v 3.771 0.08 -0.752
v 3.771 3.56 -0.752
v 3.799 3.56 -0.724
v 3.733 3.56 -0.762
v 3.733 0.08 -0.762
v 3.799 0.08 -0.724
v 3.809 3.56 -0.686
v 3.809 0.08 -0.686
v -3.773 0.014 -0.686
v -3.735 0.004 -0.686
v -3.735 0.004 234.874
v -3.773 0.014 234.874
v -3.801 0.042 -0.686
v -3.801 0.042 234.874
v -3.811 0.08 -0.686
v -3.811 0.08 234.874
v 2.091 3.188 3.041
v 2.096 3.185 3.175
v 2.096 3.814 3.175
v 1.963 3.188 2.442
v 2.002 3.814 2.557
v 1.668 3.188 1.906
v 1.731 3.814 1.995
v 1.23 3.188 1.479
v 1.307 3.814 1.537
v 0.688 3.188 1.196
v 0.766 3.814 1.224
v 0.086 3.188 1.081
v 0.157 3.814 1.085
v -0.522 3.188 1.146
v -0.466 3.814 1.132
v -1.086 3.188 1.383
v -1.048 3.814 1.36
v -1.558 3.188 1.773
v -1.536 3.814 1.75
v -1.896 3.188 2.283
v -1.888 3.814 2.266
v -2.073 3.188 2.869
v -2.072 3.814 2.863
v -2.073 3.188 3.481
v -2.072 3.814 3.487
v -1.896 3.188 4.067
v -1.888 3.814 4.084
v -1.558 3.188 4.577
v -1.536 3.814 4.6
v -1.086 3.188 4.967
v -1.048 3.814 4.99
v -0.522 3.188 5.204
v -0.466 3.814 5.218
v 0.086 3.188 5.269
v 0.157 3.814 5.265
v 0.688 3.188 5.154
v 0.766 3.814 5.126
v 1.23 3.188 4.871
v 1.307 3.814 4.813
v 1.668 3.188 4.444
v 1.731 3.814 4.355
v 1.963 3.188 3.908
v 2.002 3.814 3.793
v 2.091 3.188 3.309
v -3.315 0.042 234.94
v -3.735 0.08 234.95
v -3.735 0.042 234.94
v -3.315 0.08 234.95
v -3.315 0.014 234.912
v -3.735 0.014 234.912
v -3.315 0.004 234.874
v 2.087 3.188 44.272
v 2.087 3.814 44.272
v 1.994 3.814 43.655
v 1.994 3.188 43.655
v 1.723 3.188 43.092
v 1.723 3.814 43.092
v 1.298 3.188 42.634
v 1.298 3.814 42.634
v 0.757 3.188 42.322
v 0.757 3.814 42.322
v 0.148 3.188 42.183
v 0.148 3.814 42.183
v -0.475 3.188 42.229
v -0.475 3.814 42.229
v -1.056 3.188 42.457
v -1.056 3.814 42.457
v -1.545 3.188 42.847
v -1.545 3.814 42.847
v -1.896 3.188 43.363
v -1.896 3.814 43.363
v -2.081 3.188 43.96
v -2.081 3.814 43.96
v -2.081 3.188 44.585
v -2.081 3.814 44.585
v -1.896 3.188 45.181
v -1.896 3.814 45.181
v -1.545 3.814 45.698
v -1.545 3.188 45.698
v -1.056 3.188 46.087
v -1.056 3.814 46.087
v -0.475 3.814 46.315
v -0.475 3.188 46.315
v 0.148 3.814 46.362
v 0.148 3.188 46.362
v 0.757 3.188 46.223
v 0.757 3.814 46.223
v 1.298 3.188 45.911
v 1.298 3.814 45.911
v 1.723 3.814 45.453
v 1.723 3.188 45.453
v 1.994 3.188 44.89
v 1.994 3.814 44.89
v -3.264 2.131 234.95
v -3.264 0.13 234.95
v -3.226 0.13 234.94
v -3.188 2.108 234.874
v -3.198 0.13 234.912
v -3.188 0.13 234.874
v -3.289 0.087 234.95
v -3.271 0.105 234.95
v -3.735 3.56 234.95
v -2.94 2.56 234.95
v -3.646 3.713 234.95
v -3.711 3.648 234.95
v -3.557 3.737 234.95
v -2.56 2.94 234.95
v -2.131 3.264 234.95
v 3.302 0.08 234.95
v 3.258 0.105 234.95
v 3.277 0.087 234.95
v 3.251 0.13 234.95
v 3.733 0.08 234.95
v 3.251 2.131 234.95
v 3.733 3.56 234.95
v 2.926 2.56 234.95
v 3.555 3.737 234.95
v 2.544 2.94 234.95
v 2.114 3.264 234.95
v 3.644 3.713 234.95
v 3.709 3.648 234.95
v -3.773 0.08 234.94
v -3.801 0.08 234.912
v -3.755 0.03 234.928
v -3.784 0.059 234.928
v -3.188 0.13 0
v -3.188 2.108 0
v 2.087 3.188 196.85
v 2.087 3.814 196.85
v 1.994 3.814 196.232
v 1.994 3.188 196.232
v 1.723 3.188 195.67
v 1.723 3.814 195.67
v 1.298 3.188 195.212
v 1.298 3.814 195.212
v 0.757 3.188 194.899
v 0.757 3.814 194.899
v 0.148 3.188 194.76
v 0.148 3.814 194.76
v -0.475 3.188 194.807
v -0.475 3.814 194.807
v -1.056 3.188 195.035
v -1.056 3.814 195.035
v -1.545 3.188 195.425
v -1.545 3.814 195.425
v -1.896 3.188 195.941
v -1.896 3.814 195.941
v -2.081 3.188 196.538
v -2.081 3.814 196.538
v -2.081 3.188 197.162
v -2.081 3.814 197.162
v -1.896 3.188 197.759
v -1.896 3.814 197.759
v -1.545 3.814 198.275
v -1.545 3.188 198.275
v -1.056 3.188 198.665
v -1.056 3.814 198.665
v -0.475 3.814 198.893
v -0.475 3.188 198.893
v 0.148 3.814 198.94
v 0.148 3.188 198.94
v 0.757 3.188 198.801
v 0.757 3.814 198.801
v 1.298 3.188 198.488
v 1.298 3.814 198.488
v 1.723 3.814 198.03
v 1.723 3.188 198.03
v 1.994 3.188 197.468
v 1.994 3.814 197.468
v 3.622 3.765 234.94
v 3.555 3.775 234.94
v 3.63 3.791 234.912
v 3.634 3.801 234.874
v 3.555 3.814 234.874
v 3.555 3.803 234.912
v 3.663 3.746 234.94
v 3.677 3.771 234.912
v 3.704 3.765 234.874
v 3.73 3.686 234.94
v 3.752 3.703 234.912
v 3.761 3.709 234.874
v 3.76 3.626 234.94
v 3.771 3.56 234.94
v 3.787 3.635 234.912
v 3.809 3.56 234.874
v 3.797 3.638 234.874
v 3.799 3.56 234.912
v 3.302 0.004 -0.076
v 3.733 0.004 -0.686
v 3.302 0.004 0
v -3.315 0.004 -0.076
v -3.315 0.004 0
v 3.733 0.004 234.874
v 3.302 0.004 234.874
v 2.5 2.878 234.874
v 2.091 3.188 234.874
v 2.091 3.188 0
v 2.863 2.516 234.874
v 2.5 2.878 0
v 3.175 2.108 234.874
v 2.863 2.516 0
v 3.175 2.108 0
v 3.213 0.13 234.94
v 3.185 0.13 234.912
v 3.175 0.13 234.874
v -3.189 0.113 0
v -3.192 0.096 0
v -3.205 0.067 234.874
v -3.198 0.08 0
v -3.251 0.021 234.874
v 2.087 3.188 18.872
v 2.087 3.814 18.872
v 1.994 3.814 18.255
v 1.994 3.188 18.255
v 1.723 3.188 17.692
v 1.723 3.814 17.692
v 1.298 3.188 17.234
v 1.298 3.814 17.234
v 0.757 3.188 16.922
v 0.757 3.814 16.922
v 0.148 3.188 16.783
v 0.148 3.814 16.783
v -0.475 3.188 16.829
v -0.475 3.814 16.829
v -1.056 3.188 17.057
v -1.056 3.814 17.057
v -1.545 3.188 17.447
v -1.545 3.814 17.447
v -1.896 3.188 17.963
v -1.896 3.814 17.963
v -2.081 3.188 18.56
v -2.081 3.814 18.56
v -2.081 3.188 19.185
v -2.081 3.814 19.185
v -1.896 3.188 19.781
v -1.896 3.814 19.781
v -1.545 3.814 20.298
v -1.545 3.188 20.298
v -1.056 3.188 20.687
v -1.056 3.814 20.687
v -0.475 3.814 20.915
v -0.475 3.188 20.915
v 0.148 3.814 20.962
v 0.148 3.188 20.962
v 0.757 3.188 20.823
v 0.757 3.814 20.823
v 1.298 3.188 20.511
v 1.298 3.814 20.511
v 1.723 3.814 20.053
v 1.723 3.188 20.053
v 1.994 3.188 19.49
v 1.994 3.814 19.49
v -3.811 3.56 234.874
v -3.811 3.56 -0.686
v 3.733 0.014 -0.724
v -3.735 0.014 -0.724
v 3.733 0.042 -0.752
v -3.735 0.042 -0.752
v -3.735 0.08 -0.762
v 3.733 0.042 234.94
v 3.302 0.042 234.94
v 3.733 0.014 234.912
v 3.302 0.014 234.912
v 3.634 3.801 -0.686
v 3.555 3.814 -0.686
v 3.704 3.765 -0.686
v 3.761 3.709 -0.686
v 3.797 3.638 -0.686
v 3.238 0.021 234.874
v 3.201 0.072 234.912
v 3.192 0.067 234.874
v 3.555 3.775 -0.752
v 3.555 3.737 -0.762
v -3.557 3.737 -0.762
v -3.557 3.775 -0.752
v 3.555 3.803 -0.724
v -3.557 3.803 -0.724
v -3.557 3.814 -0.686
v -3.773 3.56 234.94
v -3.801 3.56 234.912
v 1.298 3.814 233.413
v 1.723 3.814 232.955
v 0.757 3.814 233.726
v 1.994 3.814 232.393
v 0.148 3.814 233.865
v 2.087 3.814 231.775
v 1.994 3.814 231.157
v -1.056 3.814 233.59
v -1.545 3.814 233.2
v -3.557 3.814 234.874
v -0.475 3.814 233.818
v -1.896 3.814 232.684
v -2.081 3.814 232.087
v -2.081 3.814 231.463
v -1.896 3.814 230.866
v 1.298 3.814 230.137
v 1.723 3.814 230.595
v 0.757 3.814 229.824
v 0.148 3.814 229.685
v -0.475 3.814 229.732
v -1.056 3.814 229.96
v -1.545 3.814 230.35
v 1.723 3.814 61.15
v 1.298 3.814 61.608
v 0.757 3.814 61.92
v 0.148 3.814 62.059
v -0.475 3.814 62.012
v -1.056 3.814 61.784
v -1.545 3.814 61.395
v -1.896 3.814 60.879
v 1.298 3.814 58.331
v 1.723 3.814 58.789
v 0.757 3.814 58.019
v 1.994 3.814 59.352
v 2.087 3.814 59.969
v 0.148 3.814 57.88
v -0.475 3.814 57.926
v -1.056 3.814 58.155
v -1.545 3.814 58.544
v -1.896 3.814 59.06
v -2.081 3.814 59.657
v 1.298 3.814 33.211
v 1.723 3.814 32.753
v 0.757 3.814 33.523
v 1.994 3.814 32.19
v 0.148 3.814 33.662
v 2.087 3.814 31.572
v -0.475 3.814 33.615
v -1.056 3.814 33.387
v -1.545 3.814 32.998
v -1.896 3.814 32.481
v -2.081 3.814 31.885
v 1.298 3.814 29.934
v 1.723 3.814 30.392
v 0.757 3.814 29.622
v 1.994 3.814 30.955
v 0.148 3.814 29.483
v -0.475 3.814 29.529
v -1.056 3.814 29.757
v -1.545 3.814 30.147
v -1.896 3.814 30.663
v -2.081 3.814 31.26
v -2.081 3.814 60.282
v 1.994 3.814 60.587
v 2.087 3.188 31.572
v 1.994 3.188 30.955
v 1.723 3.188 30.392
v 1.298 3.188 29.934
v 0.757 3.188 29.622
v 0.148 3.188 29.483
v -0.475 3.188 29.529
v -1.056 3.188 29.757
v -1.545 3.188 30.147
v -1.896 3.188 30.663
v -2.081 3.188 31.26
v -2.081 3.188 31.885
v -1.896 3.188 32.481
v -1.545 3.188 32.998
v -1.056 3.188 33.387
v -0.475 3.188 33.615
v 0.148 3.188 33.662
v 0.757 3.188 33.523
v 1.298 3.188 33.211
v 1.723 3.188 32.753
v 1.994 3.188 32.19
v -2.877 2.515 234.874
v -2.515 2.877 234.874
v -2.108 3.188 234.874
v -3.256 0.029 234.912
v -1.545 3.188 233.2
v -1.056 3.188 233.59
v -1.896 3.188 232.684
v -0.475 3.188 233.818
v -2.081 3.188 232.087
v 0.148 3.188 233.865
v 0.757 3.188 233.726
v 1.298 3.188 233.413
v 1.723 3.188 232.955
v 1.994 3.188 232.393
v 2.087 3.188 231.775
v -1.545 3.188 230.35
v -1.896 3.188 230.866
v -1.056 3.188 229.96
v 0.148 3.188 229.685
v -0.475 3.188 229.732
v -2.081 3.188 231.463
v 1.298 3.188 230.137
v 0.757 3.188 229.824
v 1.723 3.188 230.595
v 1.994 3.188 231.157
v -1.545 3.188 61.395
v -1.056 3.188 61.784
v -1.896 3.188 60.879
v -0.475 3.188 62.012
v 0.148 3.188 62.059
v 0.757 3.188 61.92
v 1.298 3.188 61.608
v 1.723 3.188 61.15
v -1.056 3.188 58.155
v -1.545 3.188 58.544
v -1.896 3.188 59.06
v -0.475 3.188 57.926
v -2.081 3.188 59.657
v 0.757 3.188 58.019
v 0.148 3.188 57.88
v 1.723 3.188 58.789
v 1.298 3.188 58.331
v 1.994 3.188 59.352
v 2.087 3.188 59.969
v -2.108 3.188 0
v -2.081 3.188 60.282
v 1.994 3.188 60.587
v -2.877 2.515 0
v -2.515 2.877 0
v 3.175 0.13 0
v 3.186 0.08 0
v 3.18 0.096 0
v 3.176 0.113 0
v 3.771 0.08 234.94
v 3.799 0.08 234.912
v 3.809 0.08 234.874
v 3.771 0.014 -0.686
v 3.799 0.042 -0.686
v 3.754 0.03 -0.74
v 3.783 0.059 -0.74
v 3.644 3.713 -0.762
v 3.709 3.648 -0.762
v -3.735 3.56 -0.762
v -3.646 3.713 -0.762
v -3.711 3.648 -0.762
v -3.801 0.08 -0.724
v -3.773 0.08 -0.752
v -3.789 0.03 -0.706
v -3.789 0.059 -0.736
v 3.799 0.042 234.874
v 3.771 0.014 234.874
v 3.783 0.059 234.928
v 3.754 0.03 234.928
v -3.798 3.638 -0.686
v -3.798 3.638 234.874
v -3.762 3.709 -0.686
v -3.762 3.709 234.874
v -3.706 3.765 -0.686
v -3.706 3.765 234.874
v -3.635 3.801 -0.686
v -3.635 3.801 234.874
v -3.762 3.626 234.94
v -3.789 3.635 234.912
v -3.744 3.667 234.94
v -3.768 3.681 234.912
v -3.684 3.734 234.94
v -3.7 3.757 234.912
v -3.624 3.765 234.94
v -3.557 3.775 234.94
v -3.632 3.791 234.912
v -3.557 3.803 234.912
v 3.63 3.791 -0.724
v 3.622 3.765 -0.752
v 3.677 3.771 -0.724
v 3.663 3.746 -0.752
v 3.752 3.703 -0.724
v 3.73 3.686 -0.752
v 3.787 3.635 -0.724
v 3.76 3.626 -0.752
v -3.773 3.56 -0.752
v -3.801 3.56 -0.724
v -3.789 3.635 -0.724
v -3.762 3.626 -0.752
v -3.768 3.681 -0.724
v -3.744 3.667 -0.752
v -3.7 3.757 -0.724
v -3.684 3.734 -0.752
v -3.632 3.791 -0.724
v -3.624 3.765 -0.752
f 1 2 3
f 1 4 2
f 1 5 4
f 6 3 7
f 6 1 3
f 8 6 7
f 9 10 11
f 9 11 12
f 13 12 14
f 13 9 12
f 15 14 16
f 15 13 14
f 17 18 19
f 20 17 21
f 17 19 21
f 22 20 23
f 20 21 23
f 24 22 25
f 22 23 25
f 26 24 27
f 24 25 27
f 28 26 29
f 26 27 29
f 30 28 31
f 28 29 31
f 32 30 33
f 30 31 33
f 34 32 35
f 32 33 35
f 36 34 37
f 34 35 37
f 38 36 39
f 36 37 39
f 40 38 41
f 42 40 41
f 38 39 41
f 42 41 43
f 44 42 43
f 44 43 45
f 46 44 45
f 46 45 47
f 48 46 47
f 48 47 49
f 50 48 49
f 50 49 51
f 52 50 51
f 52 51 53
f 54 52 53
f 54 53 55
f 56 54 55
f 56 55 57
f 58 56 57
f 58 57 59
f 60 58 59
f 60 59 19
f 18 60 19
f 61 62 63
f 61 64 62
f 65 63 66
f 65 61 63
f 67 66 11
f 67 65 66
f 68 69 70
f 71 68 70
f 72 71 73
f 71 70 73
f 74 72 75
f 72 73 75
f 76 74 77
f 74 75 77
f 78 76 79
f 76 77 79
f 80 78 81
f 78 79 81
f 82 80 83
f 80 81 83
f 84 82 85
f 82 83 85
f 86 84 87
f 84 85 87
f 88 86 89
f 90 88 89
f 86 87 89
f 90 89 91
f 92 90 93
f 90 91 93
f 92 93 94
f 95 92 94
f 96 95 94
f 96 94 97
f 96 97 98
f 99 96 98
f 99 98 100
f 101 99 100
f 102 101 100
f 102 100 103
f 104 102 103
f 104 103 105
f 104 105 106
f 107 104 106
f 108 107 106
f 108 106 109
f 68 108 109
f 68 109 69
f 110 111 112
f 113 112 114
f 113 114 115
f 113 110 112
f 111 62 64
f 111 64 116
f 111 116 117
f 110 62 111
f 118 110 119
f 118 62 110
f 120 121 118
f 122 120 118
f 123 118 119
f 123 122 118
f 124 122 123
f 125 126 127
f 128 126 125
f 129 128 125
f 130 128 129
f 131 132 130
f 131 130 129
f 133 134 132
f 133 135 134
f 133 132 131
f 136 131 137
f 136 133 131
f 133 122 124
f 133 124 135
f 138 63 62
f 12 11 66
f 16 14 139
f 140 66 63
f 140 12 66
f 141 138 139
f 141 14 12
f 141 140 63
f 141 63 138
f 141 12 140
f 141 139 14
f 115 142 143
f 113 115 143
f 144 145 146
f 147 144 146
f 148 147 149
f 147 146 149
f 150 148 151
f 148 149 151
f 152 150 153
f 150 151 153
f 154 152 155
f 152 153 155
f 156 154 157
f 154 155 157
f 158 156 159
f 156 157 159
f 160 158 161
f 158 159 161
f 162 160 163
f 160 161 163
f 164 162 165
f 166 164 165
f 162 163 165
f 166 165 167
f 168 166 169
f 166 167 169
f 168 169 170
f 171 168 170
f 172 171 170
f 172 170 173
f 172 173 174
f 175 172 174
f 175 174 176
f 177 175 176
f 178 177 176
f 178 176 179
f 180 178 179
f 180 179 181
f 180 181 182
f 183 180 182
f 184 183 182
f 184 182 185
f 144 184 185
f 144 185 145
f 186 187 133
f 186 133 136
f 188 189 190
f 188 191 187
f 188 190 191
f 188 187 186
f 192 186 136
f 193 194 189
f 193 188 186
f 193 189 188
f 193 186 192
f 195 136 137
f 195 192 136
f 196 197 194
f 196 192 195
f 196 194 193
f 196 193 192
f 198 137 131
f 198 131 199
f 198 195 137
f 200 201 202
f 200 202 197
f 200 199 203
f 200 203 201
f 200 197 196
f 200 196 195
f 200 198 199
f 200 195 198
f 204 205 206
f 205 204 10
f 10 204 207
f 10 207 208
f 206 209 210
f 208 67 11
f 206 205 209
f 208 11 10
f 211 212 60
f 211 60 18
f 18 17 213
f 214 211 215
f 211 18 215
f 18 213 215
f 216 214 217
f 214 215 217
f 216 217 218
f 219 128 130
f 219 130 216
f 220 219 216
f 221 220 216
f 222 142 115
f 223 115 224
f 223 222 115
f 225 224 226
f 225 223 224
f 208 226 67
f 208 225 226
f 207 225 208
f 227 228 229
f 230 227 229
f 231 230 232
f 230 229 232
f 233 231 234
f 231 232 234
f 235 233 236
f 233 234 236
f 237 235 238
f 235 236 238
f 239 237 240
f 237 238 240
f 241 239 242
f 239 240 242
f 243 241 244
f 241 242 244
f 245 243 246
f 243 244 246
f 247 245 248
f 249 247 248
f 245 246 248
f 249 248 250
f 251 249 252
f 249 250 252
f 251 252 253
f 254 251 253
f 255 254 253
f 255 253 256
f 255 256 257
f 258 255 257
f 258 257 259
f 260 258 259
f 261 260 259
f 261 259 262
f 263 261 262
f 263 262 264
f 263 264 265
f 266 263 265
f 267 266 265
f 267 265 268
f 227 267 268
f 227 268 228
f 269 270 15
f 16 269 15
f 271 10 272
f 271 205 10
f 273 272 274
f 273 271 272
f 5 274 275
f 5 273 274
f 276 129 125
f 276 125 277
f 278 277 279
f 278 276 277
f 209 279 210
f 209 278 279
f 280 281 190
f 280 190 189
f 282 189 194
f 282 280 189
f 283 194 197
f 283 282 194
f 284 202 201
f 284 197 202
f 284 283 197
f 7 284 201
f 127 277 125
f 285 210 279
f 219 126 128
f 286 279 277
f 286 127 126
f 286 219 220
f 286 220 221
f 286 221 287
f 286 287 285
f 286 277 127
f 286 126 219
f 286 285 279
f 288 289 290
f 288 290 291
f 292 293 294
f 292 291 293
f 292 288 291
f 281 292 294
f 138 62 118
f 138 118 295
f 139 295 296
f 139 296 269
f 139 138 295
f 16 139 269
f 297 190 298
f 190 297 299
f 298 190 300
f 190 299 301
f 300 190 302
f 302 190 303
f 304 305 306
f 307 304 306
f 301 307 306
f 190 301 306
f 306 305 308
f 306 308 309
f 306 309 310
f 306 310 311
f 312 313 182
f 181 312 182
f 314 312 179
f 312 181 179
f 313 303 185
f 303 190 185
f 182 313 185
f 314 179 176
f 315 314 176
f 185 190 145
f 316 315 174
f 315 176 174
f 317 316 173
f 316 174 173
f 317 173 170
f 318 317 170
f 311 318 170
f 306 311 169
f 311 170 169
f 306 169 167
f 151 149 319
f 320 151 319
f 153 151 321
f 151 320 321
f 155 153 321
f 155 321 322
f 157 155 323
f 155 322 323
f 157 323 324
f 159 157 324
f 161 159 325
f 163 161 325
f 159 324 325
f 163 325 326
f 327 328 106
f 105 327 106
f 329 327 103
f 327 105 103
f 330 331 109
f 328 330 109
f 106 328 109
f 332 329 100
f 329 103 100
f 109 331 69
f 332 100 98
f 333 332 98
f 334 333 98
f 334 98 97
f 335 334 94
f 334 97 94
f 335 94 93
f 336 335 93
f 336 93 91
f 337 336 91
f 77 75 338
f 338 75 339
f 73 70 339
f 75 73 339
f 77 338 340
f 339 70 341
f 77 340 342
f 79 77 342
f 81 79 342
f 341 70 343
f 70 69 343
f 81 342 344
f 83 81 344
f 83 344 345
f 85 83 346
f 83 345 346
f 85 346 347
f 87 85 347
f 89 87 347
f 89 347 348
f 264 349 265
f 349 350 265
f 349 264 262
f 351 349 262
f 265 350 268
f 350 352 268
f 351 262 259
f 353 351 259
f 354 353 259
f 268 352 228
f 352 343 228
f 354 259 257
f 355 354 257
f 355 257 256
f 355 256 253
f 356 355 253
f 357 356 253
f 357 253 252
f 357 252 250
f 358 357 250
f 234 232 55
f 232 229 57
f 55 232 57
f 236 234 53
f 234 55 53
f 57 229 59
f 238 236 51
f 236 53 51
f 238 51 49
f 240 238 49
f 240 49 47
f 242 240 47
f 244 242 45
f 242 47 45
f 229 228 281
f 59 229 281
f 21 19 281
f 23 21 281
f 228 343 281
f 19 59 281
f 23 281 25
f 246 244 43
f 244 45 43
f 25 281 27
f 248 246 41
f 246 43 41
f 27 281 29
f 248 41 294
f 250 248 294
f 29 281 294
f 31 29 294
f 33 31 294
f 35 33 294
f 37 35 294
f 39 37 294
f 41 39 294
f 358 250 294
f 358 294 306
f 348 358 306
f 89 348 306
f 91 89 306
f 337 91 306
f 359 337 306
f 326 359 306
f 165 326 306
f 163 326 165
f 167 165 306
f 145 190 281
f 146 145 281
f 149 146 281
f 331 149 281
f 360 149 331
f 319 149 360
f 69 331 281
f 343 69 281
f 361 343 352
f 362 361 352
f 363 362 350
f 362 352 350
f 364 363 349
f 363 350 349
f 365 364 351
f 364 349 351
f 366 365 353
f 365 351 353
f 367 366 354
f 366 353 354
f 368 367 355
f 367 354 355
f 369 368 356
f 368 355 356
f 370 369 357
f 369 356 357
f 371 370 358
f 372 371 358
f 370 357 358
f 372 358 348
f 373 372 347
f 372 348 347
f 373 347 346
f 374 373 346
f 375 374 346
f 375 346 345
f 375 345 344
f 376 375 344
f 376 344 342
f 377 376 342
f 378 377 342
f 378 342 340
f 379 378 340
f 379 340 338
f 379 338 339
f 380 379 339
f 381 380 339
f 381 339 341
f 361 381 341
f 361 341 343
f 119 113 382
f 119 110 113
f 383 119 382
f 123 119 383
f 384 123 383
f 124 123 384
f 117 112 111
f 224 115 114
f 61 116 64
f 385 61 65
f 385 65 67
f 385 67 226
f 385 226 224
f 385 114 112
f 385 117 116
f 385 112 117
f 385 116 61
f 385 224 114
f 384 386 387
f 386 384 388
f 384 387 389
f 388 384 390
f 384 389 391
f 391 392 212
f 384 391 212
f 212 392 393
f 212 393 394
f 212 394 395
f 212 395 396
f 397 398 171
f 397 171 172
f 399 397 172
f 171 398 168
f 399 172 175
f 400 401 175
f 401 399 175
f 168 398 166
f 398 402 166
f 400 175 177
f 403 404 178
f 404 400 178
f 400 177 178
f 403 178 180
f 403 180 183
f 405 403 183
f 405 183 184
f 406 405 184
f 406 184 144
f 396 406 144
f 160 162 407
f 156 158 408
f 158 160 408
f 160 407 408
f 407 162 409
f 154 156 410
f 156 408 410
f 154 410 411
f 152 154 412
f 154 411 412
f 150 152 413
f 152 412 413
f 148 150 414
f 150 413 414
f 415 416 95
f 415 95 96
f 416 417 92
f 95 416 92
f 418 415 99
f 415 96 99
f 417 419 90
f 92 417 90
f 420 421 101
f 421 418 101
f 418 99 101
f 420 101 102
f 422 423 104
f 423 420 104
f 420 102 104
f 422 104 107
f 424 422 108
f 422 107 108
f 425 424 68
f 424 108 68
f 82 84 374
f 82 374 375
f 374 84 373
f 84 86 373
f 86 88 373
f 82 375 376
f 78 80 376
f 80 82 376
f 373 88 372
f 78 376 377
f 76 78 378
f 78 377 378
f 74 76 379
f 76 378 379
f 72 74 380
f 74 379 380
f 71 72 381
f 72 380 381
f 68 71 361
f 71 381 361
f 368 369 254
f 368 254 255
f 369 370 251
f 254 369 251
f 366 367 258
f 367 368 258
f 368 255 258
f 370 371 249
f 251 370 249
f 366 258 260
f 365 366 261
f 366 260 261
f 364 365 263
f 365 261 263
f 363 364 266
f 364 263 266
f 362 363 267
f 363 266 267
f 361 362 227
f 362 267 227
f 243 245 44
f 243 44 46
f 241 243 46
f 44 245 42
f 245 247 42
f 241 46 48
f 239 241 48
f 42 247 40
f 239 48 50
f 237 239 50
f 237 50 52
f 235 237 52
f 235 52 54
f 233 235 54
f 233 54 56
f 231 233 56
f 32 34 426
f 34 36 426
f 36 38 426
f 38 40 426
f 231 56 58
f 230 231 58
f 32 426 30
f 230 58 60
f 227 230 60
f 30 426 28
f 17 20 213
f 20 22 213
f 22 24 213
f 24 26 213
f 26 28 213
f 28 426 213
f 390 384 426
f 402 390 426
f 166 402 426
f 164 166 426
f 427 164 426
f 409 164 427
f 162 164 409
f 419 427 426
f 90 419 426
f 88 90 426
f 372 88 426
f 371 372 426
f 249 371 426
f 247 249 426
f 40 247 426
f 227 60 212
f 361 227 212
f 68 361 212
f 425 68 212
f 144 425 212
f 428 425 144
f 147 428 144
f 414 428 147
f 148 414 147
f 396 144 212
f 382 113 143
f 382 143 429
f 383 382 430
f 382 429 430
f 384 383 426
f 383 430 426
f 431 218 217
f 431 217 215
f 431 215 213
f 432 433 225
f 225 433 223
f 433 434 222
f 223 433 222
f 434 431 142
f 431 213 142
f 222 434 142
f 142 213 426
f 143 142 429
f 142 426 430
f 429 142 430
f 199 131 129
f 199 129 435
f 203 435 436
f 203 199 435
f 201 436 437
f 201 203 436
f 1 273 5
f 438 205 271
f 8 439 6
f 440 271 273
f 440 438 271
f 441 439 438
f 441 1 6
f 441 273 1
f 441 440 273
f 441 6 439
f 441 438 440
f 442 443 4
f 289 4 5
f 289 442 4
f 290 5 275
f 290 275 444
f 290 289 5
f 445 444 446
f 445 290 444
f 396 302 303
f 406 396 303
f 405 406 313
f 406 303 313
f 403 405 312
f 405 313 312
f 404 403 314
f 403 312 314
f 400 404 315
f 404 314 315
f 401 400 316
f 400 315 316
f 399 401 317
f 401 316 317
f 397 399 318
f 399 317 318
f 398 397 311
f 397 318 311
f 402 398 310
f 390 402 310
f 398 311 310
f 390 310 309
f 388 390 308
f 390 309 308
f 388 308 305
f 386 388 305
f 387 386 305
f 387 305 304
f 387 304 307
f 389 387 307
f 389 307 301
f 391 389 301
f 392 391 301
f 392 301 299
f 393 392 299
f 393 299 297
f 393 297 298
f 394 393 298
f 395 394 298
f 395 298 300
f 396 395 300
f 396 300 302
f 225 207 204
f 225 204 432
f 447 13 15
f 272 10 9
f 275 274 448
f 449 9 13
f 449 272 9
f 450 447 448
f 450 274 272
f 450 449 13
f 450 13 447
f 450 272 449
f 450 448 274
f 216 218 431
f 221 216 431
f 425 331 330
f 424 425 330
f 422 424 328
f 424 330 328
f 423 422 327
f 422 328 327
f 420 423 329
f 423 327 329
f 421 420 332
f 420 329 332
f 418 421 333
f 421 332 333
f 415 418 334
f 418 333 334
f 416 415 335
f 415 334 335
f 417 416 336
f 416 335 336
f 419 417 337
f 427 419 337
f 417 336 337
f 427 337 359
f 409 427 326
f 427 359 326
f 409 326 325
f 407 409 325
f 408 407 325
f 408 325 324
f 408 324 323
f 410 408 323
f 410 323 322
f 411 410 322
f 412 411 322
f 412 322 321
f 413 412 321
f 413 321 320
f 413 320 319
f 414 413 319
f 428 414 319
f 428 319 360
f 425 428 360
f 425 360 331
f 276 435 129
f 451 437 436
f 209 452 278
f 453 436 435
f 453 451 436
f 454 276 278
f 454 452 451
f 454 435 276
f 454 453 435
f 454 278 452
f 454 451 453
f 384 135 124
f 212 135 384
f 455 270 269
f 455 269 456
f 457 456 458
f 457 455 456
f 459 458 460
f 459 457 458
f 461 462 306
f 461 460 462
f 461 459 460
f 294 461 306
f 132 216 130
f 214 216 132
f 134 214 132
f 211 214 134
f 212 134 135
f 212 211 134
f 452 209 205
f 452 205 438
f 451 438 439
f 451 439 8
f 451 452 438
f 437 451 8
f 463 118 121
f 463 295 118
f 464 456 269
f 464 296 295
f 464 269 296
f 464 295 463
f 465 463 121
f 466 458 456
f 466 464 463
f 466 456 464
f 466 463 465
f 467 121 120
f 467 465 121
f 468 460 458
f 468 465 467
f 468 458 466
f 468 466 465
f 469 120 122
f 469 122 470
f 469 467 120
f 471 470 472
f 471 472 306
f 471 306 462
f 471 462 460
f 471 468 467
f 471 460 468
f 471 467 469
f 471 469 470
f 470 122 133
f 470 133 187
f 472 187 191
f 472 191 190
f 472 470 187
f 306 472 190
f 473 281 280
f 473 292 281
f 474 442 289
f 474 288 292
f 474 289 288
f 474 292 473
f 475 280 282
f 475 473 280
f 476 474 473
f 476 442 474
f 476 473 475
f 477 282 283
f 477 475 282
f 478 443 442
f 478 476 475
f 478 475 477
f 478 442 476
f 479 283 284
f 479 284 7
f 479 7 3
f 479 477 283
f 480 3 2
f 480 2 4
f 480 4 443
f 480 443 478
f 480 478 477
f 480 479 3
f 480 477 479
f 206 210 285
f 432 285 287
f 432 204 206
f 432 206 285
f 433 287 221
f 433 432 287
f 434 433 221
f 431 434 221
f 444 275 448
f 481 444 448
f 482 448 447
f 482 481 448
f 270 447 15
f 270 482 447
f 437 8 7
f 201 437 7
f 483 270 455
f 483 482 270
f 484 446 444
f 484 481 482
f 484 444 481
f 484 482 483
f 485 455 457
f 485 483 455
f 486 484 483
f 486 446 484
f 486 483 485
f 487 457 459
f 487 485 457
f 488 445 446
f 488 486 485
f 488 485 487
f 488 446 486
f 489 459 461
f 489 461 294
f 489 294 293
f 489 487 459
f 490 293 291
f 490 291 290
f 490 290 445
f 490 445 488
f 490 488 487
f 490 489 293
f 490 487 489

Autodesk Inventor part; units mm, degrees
ref_plane "YZ Plane" through (0, 0, 0) normal (1, 0, 0) x (0, 1, 0)
ref_plane "XZ Plane" through (0, 0, 0) normal (0, 1, 0) x (-1, 0, 0)
ref_plane "XY Plane" through (0, 0, 0) normal (0, 0, 1) x (1, 0, 0)
sketch "Sketch1" plane through (0, 0, 0) normal (0, 0, 1) x (1, 0, 0)
  line L0 (-2.1082, 3.1877) -> (2.0912, 3.1877)
  line L1 (3.175, 2.1082) -> (3.175, 0.1305)
  line L2 (-3.1877, 0.1305) -> (-3.1877, 2.1082)
  arc A0 (-2.1082, 3.1877) -> (-3.1877, 2.1082) centre (-0.0085, 0.0085) ccw
  line L3 (-2.1082, 3.1877) -> (-3.1877, 2.1082) construction
  line L4 (-2.1082, 3.1877) -> (-0.5816, 3.1877) construction
  arc A1 (3.175, 2.1082) -> (2.0912, 3.1877) centre (-0.0009, 0.0035) ccw
  line L5 (3.8091, 0.0035) -> (3.8091, 3.5595)
  line L6 (3.5551, 3.8135) -> (-3.5569, 3.8135)
  line L7 (-3.8109, 3.5595) -> (-3.8109, 0.0035)
  arc A2 (-3.5569, 3.8135) -> (-3.8109, 3.5595) centre (-3.5569, 3.5595) ccw
  arc A3 (3.8091, 3.5595) -> (3.5551, 3.8135) centre (3.5551, 3.5595) ccw
  line L8 (-3.8109, 0.0035) -> (-3.3147, 0.0035)
  line L9 (3.302, 0.0035) -> (3.8091, 0.0035)
  arc A4 (-3.3147, 0.0035) -> (-3.1877, 0.1305) centre (-3.3147, 0.1305) ccw
  arc A5 (3.175, 0.1305) -> (3.302, 0.0035) centre (3.302, 0.1305) ccw
  point P0 (0, 0)
  point P1 (3.8091, 3.8135)
  point P2 (-3.8109, 3.8135)
  dimension "d0" = 135
  dimension "d1" = 3.81
  dimension "d2" = 3.81
  dimension "d3" = 7.62
  dimension "d4" = 3.81
  dimension "d5" = 0.254
  dimension "d6" = 0.127
extrude "Extrusion1" add sketch "Sketch1" along normal blind 234.95
sketch "Sketch2" plane through (0, 0, 0) normal (0, 0, -1) x (-1, 0, 0)
  line L0 (-3.302, 0.0035) -> (-3.8091, 0.0035) projected
  line L1 (3.5569, 3.8135) -> (-3.5551, 3.8135)
  line L2 (-3.8091, 3.5595) -> (-3.8091, 0.0035)
  line L3 (-3.8091, 0.0035) -> (3.8109, 0.0035)
  line L4 (3.8109, 0.0035) -> (3.8109, 3.5595)
  arc A0 (3.8109, 3.5595) -> (3.5569, 3.8135) centre (3.5569, 3.5595) ccw
  arc A1 (-3.5551, 3.8135) -> (-3.8091, 3.5595) centre (-3.5551, 3.5595) ccw
  point P0 (0, 0)
  dimension "d9" = 0.254
extrude "Extrusion2" add sketch "Sketch2" along normal blind 0.762
sketch "Sketch4" plane through (-0.0085, 3.8135, 0) normal (0, 1, 0) x (1, 0, 0)
  circle A0 centre (0.0085, -3.175) radius 2.0955
  circle A1 centre (0, -231.775) radius 2.0955
  circle A2 centre (0, -196.85) radius 2.0955
  circle A3 centre (0, -59.9694) radius 2.0955
  circle A4 centre (0, -31.5722) radius 2.0955
  circle A5 centre (0, -44.2722) radius 2.0955
  circle A6 centre (0, -18.8722) radius 2.0955
  point P0 (0.0085, 0)
  dimension "d15" = 4.191
  dimension "d16" = 4.191
  dimension "d17" = 4.191
  dimension "d18" = 4.191
  dimension "d19" = 4.191
  dimension "d20" = 4.191
  dimension "d21" = 4.191
extrude "Extrusion3" cut sketch "Sketch4" against normal blind 4.191
fillet "Fillet1" radius 0.0762 23 edges at (3.8091, 0.0035, 117.094) (-0.0009, 0.0035, -0.762) (3.7347, 3.7391, -0.762) (-0.0009, 3.8135, -0.762) (-3.7365, 3.7391, -0.762) (-3.8109, 1.7815, -0.762) (3.8091, 1.7815, -0.762) (-3.8109, 0.0035, 117.094) (-0.0063, 0.0035, 0) (3.2122, 0.0407, 234.95) (3.175, 1.1193, 234.95) (3.5556, 0.0035, 234.95) (3.7347, 3.7391, 234.95) (-0.0009, 3.8135, 234.95) (-3.7365, 3.7391, 234.95) (-3.8109, 1.7815, 234.95) (3.8091, 1.7815, 234.95) (2.6878, 2.7029, 234.95) (-0.0085, 3.1877, 234.95) (-2.7026, 2.7026, 234.95) (-3.2249, 0.0407, 234.95) (-3.5628, 0.0035, 234.95) (-3.1877, 1.1193, 234.95)
equation "\"d22\" = d20"
properties part number "hs_brace_jig" material "ABS Plastic"
